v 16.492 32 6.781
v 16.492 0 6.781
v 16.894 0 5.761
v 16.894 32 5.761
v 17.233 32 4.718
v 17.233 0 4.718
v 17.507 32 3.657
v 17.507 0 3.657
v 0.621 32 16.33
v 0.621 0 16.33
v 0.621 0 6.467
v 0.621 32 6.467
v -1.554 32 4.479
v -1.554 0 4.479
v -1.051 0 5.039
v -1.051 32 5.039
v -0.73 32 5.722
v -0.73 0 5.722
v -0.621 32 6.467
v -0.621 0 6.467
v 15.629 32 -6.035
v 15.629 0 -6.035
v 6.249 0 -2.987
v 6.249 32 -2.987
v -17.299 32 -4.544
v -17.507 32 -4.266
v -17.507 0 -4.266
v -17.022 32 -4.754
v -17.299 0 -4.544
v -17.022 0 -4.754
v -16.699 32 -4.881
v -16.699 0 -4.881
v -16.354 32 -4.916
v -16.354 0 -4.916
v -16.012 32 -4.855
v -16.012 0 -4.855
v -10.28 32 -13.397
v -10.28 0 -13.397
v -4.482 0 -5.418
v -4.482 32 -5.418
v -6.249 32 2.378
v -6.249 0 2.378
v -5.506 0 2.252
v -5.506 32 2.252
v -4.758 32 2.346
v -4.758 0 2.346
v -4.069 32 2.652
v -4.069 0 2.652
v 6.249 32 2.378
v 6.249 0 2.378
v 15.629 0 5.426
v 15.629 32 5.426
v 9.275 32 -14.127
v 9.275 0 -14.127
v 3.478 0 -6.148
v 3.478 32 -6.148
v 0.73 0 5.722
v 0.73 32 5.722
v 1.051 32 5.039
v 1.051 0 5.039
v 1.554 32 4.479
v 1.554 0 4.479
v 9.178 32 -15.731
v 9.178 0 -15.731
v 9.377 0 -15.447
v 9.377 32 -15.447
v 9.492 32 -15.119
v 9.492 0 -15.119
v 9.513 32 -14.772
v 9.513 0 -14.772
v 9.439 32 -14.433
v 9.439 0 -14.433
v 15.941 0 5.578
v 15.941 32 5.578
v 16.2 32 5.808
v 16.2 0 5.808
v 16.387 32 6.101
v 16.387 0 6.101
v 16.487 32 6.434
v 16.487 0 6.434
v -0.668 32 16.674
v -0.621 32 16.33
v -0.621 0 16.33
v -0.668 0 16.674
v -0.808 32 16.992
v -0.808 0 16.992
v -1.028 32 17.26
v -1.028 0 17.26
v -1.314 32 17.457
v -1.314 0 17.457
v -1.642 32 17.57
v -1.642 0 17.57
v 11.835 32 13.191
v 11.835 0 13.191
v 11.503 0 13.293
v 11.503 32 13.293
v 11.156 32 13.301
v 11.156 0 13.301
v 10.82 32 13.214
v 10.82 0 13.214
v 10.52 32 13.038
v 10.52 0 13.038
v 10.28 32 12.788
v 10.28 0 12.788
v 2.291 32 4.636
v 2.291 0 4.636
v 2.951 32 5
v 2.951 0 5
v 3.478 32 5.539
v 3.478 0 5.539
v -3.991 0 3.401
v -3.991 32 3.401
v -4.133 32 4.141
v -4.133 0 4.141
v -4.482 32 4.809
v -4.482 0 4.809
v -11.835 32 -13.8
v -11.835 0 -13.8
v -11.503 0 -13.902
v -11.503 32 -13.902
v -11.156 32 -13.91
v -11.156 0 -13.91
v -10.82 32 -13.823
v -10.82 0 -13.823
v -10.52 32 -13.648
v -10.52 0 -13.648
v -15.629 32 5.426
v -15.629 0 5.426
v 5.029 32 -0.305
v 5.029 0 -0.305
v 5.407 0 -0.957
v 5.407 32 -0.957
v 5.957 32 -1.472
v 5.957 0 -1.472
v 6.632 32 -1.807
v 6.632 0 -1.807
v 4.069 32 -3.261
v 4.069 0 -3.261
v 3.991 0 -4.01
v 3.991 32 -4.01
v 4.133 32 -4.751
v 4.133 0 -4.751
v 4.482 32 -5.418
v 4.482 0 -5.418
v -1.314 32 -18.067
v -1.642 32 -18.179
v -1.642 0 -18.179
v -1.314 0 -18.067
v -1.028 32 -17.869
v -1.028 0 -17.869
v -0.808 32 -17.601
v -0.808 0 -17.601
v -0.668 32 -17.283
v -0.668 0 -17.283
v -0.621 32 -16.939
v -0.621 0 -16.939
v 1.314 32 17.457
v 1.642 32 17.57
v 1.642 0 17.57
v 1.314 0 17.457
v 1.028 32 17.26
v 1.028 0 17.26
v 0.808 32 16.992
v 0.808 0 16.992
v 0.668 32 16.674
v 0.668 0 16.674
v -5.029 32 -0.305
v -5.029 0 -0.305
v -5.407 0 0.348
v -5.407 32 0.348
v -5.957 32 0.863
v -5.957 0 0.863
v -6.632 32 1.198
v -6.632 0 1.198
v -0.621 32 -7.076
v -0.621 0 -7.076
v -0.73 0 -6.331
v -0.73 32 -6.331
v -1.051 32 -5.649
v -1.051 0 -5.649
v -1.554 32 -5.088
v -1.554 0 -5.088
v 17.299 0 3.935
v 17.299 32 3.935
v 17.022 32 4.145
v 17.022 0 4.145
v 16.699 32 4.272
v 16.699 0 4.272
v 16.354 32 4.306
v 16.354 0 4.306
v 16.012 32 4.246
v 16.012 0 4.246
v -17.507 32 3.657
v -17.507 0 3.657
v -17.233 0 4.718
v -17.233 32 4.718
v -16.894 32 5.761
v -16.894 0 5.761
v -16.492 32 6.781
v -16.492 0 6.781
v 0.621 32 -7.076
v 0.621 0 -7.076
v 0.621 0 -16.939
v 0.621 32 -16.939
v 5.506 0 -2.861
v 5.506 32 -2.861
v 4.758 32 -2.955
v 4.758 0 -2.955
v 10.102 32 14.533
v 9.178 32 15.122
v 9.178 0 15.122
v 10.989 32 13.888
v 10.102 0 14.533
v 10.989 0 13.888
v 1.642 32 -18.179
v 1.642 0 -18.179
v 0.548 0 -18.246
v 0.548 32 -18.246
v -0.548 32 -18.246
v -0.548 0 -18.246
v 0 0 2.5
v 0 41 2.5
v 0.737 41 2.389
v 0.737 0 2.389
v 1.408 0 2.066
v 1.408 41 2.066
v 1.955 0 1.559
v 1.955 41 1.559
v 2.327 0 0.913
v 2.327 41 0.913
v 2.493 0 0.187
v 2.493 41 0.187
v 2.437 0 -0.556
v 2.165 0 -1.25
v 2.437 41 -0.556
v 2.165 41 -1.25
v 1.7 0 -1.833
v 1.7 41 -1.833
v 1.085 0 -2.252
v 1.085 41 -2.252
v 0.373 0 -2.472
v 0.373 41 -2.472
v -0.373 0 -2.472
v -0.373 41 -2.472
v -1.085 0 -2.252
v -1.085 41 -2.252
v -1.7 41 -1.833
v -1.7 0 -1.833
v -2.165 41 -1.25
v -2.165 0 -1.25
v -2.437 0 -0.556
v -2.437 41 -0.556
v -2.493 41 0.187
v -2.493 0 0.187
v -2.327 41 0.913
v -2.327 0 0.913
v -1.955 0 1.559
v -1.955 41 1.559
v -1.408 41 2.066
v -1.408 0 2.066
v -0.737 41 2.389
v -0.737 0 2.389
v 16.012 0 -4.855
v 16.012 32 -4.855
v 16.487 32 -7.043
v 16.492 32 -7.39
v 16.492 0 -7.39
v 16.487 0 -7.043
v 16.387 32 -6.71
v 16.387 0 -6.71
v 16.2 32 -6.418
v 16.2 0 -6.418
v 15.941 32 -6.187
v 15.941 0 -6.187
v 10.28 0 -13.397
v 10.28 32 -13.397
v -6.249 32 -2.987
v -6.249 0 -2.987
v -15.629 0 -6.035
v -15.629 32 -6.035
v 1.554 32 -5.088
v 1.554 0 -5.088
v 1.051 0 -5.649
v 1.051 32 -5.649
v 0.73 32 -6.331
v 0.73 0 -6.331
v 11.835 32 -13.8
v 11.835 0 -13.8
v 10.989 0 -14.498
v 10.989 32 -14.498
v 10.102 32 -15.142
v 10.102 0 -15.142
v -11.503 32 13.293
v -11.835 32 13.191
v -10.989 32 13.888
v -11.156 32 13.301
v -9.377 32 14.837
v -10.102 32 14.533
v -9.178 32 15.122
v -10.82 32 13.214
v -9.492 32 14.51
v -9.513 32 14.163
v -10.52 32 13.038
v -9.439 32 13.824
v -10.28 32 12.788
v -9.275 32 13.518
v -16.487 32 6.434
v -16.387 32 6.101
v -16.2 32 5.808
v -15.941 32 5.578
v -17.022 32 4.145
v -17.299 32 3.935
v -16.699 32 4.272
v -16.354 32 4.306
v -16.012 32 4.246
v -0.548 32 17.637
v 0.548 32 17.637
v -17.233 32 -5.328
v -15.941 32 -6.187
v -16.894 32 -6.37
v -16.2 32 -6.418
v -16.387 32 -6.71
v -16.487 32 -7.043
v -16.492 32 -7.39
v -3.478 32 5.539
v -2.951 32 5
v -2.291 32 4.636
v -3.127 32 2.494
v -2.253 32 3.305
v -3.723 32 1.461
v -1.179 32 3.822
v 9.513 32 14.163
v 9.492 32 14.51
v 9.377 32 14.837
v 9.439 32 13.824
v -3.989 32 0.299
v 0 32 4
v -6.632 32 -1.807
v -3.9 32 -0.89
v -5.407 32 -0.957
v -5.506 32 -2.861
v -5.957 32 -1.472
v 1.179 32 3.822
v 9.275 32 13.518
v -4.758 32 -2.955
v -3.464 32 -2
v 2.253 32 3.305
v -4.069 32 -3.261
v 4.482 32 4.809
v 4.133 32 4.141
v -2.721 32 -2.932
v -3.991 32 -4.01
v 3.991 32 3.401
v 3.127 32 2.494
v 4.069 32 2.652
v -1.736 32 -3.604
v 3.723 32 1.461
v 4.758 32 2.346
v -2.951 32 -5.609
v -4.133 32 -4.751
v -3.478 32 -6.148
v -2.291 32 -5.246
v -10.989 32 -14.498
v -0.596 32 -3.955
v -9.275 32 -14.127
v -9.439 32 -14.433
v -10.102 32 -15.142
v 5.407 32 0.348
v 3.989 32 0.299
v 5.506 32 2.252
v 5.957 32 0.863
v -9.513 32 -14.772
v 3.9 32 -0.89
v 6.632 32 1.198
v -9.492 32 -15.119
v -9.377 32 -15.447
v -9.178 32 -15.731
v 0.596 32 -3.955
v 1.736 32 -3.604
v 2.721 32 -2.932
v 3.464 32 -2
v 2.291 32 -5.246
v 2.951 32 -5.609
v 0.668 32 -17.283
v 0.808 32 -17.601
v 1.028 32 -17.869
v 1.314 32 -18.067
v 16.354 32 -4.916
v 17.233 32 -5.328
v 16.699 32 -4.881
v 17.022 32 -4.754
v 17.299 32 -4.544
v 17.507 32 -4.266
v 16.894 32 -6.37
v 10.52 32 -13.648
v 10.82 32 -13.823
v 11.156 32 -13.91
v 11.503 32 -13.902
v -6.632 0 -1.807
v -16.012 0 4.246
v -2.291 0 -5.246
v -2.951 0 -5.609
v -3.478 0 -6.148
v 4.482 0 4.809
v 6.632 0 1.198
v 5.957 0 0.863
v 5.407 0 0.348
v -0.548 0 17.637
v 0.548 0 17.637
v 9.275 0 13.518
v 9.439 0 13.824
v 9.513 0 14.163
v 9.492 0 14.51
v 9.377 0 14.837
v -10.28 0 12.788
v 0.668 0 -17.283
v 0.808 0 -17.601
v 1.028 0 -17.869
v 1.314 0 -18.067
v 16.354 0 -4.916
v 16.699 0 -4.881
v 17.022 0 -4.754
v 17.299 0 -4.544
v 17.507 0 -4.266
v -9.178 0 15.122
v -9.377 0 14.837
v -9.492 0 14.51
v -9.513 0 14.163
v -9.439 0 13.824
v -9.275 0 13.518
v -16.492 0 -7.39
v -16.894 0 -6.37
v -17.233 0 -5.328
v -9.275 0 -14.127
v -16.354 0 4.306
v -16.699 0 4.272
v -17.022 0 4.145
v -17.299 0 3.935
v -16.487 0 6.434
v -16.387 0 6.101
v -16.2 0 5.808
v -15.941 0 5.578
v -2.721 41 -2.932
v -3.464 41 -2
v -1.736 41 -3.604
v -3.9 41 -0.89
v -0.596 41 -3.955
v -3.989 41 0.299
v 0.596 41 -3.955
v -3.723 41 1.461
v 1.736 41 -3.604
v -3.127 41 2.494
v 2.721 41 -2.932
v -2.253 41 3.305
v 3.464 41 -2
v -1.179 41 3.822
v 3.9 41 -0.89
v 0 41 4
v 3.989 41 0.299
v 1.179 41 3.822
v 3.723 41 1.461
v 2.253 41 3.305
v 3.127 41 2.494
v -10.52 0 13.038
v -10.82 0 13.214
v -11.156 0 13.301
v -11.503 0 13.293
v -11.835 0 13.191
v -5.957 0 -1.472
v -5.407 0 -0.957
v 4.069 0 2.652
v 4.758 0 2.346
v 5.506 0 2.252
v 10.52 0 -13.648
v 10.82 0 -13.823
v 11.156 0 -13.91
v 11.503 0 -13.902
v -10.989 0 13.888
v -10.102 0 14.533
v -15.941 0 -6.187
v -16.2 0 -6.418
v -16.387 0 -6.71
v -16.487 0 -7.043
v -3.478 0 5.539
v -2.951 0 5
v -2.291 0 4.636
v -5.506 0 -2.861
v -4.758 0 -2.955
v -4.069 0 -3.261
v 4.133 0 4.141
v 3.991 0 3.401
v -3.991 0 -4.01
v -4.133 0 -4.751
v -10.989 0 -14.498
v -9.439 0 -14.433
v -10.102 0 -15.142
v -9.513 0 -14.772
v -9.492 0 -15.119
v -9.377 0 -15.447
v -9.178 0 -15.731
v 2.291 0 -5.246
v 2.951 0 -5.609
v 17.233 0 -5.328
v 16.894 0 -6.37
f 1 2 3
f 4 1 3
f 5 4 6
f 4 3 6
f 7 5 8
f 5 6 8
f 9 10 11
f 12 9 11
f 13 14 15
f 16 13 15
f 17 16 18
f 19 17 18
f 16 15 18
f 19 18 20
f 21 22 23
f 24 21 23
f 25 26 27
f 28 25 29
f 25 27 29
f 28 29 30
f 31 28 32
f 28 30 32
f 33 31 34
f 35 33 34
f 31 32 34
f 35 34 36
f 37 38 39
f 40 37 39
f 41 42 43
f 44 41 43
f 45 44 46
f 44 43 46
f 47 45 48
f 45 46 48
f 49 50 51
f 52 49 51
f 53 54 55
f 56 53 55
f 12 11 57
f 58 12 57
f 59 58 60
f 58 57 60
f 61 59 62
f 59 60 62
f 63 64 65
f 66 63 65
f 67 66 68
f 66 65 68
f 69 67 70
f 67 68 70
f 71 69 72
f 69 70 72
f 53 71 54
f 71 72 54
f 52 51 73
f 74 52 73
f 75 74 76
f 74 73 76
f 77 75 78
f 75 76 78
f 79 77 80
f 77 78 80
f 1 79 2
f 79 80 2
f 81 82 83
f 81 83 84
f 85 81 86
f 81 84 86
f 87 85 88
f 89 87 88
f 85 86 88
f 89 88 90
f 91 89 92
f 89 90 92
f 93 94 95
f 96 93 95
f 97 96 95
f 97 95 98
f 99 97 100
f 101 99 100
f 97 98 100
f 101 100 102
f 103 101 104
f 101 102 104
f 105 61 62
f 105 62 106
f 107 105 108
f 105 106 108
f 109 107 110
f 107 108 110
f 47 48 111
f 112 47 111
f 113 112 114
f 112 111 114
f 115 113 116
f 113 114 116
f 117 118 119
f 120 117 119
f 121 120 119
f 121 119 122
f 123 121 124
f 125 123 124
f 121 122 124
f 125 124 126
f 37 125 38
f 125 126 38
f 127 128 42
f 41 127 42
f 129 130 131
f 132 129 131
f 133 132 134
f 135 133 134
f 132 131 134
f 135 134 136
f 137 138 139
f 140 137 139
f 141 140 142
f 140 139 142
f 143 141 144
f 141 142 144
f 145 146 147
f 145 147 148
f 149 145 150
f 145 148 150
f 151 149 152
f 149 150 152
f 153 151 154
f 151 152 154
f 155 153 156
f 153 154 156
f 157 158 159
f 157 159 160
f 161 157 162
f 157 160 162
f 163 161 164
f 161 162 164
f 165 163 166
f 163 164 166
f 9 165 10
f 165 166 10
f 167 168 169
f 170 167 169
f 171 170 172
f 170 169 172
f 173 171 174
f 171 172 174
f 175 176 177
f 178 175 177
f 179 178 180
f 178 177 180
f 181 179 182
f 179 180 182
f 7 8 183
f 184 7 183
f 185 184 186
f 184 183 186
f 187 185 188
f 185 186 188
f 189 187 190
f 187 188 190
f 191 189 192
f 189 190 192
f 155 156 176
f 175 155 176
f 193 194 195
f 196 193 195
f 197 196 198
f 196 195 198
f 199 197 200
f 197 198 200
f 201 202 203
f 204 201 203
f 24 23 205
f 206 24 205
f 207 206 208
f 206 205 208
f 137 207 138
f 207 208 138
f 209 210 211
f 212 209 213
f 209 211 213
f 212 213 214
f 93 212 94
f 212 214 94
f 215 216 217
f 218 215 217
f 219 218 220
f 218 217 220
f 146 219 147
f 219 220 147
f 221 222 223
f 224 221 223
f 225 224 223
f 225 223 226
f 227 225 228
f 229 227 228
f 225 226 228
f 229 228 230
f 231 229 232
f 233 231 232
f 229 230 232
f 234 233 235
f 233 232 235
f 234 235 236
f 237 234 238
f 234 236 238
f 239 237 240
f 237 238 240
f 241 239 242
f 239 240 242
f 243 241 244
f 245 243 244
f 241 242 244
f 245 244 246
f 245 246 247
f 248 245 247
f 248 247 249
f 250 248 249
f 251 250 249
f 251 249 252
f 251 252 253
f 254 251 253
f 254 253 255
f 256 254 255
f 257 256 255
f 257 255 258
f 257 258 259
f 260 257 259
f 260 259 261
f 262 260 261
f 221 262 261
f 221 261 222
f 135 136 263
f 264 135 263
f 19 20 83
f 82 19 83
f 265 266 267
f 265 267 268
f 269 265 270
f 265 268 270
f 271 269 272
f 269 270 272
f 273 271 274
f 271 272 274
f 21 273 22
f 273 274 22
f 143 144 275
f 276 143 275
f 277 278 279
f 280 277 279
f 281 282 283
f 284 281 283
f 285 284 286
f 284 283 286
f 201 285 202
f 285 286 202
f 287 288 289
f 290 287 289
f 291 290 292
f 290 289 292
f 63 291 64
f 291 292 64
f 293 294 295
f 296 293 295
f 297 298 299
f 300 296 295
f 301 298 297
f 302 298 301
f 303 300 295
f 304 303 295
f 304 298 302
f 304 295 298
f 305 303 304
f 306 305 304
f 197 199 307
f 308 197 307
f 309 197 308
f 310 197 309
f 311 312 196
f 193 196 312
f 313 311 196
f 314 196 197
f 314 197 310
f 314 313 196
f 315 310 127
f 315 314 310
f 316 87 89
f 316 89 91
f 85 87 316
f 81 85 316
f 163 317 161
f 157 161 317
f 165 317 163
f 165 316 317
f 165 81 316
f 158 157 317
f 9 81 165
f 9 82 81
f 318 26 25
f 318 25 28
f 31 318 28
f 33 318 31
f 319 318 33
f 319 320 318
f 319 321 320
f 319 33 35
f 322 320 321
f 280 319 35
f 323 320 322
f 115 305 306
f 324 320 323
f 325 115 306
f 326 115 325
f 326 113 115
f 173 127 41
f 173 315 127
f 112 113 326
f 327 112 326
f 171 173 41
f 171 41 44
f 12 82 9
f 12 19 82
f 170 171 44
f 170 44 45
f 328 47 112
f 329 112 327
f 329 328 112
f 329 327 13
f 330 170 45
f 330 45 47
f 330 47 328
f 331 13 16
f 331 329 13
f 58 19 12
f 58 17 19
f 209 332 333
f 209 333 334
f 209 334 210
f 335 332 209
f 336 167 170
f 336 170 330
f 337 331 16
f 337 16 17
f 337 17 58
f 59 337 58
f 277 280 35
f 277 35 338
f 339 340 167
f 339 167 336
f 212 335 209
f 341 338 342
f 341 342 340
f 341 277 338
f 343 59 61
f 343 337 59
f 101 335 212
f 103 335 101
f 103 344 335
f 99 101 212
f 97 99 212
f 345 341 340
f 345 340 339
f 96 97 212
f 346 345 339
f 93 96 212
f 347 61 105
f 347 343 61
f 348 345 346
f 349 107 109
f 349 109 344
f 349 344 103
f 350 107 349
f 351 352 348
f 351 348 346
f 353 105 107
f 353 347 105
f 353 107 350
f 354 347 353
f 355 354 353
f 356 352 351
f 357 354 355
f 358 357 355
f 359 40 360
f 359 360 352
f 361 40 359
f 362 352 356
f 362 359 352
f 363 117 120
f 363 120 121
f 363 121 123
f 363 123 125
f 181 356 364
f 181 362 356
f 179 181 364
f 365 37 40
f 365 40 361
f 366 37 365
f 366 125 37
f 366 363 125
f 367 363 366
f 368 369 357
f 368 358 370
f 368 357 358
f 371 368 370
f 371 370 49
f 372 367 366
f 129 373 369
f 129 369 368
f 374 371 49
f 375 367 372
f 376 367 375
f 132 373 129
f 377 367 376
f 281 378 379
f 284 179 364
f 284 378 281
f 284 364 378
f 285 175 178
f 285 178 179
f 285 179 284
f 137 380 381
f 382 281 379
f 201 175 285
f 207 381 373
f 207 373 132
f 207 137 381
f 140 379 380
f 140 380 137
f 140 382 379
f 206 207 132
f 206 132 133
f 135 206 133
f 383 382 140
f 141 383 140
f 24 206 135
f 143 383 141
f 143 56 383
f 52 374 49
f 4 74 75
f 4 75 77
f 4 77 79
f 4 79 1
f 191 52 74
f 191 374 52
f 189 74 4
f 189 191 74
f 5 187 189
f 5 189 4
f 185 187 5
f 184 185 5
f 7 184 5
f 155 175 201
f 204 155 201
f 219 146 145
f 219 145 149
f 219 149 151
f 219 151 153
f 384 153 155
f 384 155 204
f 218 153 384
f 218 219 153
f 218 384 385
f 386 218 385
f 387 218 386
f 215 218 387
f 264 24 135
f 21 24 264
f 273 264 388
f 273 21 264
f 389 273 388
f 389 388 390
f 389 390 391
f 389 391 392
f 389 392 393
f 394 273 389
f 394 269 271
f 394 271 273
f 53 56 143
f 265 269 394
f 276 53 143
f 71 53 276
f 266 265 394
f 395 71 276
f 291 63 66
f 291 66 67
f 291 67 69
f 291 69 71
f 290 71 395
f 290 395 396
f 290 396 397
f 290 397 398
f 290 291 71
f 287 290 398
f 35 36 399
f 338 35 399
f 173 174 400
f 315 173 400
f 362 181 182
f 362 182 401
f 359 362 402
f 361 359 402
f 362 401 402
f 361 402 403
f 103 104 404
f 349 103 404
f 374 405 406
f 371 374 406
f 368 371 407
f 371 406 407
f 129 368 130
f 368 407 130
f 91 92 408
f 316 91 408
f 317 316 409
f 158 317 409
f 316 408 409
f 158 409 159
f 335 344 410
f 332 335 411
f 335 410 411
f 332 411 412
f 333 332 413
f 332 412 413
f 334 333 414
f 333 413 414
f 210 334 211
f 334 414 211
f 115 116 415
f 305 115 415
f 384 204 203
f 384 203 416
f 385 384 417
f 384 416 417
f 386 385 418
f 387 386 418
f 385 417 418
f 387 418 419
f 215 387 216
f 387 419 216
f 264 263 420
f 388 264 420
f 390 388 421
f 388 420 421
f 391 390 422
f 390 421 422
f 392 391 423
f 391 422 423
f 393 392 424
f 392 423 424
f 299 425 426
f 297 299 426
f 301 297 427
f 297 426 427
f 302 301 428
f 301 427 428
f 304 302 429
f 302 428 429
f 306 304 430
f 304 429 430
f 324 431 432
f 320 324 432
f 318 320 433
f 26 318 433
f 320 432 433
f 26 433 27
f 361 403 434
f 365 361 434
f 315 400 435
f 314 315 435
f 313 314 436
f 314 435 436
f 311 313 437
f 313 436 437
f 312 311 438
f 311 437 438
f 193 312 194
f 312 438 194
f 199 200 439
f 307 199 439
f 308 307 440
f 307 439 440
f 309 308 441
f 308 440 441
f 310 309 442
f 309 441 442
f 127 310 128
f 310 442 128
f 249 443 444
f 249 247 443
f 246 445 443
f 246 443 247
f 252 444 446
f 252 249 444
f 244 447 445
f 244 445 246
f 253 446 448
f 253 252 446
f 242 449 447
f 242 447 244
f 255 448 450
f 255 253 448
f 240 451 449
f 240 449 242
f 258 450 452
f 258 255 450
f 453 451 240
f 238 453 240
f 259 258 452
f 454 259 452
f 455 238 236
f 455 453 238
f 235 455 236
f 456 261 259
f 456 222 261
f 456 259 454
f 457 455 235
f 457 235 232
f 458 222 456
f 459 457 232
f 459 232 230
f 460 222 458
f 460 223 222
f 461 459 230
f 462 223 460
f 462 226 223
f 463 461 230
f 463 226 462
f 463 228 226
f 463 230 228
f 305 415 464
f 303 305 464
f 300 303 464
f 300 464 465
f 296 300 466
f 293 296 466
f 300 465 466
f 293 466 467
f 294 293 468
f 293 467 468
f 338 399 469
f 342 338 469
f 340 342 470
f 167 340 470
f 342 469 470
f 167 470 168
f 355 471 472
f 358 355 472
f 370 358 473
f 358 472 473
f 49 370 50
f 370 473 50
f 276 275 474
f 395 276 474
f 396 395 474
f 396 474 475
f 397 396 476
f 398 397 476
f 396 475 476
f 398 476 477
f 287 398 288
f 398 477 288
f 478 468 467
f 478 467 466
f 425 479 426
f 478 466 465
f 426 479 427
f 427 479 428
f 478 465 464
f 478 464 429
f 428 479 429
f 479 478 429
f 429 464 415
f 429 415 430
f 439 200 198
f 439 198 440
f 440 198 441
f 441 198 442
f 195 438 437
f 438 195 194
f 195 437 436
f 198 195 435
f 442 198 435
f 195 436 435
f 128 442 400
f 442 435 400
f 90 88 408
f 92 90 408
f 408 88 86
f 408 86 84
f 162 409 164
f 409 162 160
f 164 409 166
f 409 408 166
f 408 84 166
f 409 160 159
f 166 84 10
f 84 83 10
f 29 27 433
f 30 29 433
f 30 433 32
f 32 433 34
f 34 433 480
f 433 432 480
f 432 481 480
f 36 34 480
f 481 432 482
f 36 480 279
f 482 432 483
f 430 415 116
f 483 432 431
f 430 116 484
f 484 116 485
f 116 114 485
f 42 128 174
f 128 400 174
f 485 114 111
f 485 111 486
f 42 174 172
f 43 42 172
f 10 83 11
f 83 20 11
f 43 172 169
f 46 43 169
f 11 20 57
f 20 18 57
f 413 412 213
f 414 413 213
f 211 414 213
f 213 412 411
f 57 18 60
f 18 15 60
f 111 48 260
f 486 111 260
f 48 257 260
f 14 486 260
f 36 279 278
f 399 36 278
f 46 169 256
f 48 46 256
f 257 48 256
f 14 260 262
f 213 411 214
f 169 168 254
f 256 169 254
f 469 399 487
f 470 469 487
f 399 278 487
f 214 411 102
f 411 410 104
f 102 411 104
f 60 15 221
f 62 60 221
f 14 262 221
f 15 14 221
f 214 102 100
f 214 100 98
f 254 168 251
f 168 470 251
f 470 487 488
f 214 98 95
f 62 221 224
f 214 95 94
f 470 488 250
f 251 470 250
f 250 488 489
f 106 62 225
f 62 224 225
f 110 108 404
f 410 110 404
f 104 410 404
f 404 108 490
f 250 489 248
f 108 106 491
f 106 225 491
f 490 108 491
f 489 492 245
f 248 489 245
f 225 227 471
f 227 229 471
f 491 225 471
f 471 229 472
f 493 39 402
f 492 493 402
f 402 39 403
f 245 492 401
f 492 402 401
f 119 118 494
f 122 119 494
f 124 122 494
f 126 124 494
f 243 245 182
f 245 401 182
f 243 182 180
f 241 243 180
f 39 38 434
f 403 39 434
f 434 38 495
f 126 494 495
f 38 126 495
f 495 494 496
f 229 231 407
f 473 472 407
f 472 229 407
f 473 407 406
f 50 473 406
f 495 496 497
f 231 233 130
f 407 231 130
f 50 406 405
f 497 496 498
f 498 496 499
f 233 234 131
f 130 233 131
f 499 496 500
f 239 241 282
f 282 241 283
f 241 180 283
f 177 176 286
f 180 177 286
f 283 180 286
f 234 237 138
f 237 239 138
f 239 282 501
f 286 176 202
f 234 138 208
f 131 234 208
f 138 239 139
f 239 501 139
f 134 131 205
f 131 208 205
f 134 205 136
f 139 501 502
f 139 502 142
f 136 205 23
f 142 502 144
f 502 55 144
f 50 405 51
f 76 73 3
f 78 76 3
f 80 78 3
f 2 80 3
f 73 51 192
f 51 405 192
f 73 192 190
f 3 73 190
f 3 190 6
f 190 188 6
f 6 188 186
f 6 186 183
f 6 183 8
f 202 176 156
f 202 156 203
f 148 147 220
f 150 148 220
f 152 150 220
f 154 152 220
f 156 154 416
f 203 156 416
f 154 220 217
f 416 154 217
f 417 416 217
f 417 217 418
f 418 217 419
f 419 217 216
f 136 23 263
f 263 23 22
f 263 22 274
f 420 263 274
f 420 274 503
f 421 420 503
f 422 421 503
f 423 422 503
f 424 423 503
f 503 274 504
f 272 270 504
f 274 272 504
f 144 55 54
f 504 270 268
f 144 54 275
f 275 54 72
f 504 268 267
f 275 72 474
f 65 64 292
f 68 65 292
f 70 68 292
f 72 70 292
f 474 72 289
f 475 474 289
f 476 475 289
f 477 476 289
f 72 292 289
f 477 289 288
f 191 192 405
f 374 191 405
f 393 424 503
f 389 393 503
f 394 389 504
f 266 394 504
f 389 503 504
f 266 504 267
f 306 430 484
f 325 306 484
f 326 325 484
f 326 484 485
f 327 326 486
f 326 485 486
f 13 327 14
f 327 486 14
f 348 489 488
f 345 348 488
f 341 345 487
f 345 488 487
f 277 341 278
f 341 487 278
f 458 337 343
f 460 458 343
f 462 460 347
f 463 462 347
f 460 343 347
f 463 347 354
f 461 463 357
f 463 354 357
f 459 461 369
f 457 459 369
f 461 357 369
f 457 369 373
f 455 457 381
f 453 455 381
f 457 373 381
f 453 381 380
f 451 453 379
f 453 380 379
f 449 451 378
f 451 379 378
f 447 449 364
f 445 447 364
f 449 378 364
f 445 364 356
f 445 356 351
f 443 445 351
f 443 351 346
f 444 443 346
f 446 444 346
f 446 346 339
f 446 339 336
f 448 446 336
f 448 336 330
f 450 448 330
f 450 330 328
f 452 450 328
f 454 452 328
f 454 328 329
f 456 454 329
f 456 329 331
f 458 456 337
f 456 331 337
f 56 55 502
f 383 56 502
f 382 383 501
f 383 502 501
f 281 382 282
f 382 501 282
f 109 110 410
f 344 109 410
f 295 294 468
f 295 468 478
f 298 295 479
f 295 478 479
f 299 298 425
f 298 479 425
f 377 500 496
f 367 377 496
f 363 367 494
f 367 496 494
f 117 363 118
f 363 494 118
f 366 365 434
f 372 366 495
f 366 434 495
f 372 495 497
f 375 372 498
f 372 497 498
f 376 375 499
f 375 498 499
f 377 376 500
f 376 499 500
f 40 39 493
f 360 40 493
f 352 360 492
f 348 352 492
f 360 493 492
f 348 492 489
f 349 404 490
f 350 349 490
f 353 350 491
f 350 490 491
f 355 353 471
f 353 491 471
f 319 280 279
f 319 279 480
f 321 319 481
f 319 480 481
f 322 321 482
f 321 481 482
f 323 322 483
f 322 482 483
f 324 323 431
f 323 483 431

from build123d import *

# Parameters (mm, degrees)
EXTRUDE_1_DEPTH     = 32
SKETCH_3_R          = 4
EXTRUDE_2_DEPTH     = 9
SKETCH_4_R          = 2.5
CUT_EXTRUDE_1_DEPTH = 49.174035829


with BuildPart() as part:
    # 草图2 → 凸台-拉伸1 (new body)
    with BuildSketch(Plane(origin=(0, 0, 0), x_dir=(1, 0, 0), z_dir=(0, 1, 0))):
        with BuildLine():
            Line((-0.620533184, 16.939122741), (-0.620533184, 7.076499426))
            ThreePointArc((-0.620533184, 7.076499426), (-0.865551691, 5.978035603), (-1.554155931, 5.087821563))
            ThreePointArc((-1.554155931, 5.087821563), (-2.634503149, 5.403268433), (-3.47838812, 6.147926068))
            Line((-3.47838812, 6.147926068), (-9.275492654, 14.126955939))
            ThreePointArc((-9.275492654, 14.126955939), (-9.514491938, 14.94638072), (-9.177971495, 15.730811482))
            ThreePointArc((-9.177971495, 15.730811482), (-10.550745279, 14.826476488), (-11.835029396, 13.800345917))
            ThreePointArc((-11.835029396, 13.800345917), (-10.985000873, 13.877993441), (-10.279536436, 13.397475432))
            Line((-10.279536436, 13.397475432), (-4.482431902, 5.41844556))
            ThreePointArc((-4.482431902, 5.41844556), (-4.034995203, 4.385751395), (-4.068833052, 3.260801691))
            ThreePointArc((-4.068833052, 3.260801691), (-5.128267329, 2.880991407), (-6.248683387, 2.987408949))
            Line((-6.248683387, 2.987408949), (-15.62859556, 6.035127162))
            ThreePointArc((-15.62859556, 6.035127162), (-16.303595844, 6.557575481), (-16.49242192, 7.389995052))
            ThreePointArc((-16.49242192, 7.389995052), (-17.071464467, 5.851476488), (-17.507327728, 4.266436154))
            ThreePointArc((-17.507327728, 4.266436154), (-16.865280276, 4.82888855), (-16.012106158, 4.854802907))
            Line((-16.012106158, 4.854802907), (-6.632193986, 1.807084693))
            ThreePointArc((-6.632193986, 1.807084693), (-5.663207692, 1.234614256), (-5.029354242, 0.304621439))
            ThreePointArc((-5.029354242, 0.304621439), (-5.663207692, -0.625371378), (-6.632193986, -1.197841815))
            Line((-6.632193986, -1.197841815), (-16.012106158, -4.245560029))
            ThreePointArc((-16.012106158, -4.245560029), (-16.865280276, -4.219645672), (-17.507327728, -3.657193276))
            ThreePointArc((-17.507327728, -3.657193276), (-17.071464467, -5.24223361), (-16.49242192, -6.780752173))
            ThreePointArc((-16.49242192, -6.780752173), (-16.303595844, -5.948332603), (-15.62859556, -5.425884284))
            Line((-15.62859556, -5.425884284), (-6.248683387, -2.37816607))
            ThreePointArc((-6.248683387, -2.37816607), (-5.128267329, -2.271748529), (-4.068833052, -2.651558813))
            ThreePointArc((-4.068833052, -2.651558813), (-4.034995203, -3.776508517), (-4.482431902, -4.809202682))
            Line((-4.482431902, -4.809202682), (-10.279536436, -12.788232554))
            ThreePointArc((-10.279536436, -12.788232554), (-10.985000873, -13.268750563), (-11.835029396, -13.191103039))
            ThreePointArc((-11.835029396, -13.191103039), (-10.550745279, -14.21723361), (-9.177971495, -15.121568604))
            ThreePointArc((-9.177971495, -15.121568604), (-9.514491938, -14.337137842), (-9.275492654, -13.517713061))
            Line((-9.275492654, -13.517713061), (-3.47838812, -5.53868319))
            ThreePointArc((-3.47838812, -5.53868319), (-2.634503149, -4.794025555), (-1.554155931, -4.478578685))
            ThreePointArc((-1.554155931, -4.478578685), (-0.865551691, -5.368792725), (-0.620533184, -6.467256547))
            Line((-0.620533184, -6.467256547), (-0.620533184, -16.329879863))
            ThreePointArc((-0.620533184, -16.329879863), (-0.908824502, -17.133288691), (-1.642152093, -17.570104755))
            ThreePointArc((-1.642152093, -17.570104755), (0, -17.645378561), (1.642152093, -17.570104755))
            ThreePointArc((1.642152093, -17.570104755), (0.908824502, -17.133288691), (0.620533184, -16.329879863))
            Line((0.620533184, -16.329879863), (0.620533184, -6.467256547))
            ThreePointArc((0.620533184, -6.467256547), (0.865551691, -5.368792725), (1.554155931, -4.478578685))
            ThreePointArc((1.554155931, -4.478578685), (2.634503149, -4.794025555), (3.47838812, -5.53868319))
            Line((3.47838812, -5.53868319), (9.275492654, -13.517713061))
            ThreePointArc((9.275492654, -13.517713061), (9.514491938, -14.337137842), (9.177971495, -15.121568604))
            ThreePointArc((9.177971495, -15.121568604), (10.550745279, -14.21723361), (11.835029396, -13.191103039))
            ThreePointArc((11.835029396, -13.191103039), (10.985000873, -13.268750563), (10.279536436, -12.788232554))
            Line((10.279536436, -12.788232554), (4.482431902, -4.809202682))
            ThreePointArc((4.482431902, -4.809202682), (4.034995203, -3.776508517), (4.068833052, -2.651558813))
            ThreePointArc((4.068833052, -2.651558813), (5.128267329, -2.271748529), (6.248683387, -2.37816607))
            Line((6.248683387, -2.37816607), (15.62859556, -5.425884284))
            ThreePointArc((15.62859556, -5.425884284), (16.303595844, -5.948332603), (16.49242192, -6.780752173))
            ThreePointArc((16.49242192, -6.780752173), (17.071464467, -5.24223361), (17.507327728, -3.657193276))
            ThreePointArc((17.507327728, -3.657193276), (16.865280276, -4.219645672), (16.012106158, -4.245560029))
            Line((16.012106158, -4.245560029), (6.632193986, -1.197841815))
            ThreePointArc((6.632193986, -1.197841815), (5.663207692, -0.625371378), (5.029354242, 0.304621439))
            ThreePointArc((5.029354242, 0.304621439), (5.663207692, 1.234614256), (6.632193986, 1.807084693))
            Line((6.632193986, 1.807084693), (16.012106158, 4.854802907))
            ThreePointArc((16.012106158, 4.854802907), (16.865280276, 4.82888855), (17.507327728, 4.266436154))
            ThreePointArc((17.507327728, 4.266436154), (17.071464467, 5.851476488), (16.49242192, 7.389995052))
            ThreePointArc((16.49242192, 7.389995052), (16.303595844, 6.557575481), (15.62859556, 6.035127162))
            Line((15.62859556, 6.035127162), (6.248683387, 2.987408949))
            ThreePointArc((6.248683387, 2.987408949), (5.128267329, 2.880991407), (4.068833052, 3.260801691))
            ThreePointArc((4.068833052, 3.260801691), (4.034995203, 4.385751395), (4.482431902, 5.41844556))
            Line((4.482431902, 5.41844556), (10.279536436, 13.397475432))
            ThreePointArc((10.279536436, 13.397475432), (10.985000873, 13.877993441), (11.835029396, 13.800345917))
            ThreePointArc((11.835029396, 13.800345917), (10.550745279, 14.826476488), (9.177971495, 15.730811482))
            ThreePointArc((9.177971495, 15.730811482), (9.514491938, 14.94638072), (9.275492654, 14.126955939))
            Line((9.275492654, 14.126955939), (3.47838812, 6.147926068))
            ThreePointArc((3.47838812, 6.147926068), (2.634503149, 5.403268433), (1.554155931, 5.087821563))
            ThreePointArc((1.554155931, 5.087821563), (0.865551691, 5.978035603), (0.620533184, 7.076499426))
            Line((0.620533184, 7.076499426), (0.620533184, 16.939122741))
            ThreePointArc((0.620533184, 16.939122741), (0.908824502, 17.742531569), (1.642152093, 18.179347633))
            ThreePointArc((1.642152093, 18.179347633), (0, 18.254621439), (-1.642152093, 18.179347633))
            ThreePointArc((-1.642152093, 18.179347633), (-0.908824502, 17.742531569), (-0.620533184, 16.939122741))
        make_face()
    extrude(amount=EXTRUDE_1_DEPTH)

    # 草图3 → 凸台-拉伸2 (add)
    with BuildSketch(Plane(origin=(0, 32, 0), x_dir=(1, 0, 0), z_dir=(0, 1, 0))):
        with Locations(Location((0, 0, 0), (0, 0, 270))):
            Circle(SKETCH_3_R)
    extrude(amount=EXTRUDE_2_DEPTH)

    # 草图4 → 切除-拉伸1 (cut, through all)
    with BuildSketch(Plane(origin=(0, 41, 0), x_dir=(1, 0, 0), z_dir=(0, 1, 0))):
        with Locations(Location((0, 0, 0), (0, 0, 270))):
            Circle(SKETCH_4_R)
    extrude(amount=-CUT_EXTRUDE_1_DEPTH, mode=Mode.SUBTRACT)


solid = part.part
